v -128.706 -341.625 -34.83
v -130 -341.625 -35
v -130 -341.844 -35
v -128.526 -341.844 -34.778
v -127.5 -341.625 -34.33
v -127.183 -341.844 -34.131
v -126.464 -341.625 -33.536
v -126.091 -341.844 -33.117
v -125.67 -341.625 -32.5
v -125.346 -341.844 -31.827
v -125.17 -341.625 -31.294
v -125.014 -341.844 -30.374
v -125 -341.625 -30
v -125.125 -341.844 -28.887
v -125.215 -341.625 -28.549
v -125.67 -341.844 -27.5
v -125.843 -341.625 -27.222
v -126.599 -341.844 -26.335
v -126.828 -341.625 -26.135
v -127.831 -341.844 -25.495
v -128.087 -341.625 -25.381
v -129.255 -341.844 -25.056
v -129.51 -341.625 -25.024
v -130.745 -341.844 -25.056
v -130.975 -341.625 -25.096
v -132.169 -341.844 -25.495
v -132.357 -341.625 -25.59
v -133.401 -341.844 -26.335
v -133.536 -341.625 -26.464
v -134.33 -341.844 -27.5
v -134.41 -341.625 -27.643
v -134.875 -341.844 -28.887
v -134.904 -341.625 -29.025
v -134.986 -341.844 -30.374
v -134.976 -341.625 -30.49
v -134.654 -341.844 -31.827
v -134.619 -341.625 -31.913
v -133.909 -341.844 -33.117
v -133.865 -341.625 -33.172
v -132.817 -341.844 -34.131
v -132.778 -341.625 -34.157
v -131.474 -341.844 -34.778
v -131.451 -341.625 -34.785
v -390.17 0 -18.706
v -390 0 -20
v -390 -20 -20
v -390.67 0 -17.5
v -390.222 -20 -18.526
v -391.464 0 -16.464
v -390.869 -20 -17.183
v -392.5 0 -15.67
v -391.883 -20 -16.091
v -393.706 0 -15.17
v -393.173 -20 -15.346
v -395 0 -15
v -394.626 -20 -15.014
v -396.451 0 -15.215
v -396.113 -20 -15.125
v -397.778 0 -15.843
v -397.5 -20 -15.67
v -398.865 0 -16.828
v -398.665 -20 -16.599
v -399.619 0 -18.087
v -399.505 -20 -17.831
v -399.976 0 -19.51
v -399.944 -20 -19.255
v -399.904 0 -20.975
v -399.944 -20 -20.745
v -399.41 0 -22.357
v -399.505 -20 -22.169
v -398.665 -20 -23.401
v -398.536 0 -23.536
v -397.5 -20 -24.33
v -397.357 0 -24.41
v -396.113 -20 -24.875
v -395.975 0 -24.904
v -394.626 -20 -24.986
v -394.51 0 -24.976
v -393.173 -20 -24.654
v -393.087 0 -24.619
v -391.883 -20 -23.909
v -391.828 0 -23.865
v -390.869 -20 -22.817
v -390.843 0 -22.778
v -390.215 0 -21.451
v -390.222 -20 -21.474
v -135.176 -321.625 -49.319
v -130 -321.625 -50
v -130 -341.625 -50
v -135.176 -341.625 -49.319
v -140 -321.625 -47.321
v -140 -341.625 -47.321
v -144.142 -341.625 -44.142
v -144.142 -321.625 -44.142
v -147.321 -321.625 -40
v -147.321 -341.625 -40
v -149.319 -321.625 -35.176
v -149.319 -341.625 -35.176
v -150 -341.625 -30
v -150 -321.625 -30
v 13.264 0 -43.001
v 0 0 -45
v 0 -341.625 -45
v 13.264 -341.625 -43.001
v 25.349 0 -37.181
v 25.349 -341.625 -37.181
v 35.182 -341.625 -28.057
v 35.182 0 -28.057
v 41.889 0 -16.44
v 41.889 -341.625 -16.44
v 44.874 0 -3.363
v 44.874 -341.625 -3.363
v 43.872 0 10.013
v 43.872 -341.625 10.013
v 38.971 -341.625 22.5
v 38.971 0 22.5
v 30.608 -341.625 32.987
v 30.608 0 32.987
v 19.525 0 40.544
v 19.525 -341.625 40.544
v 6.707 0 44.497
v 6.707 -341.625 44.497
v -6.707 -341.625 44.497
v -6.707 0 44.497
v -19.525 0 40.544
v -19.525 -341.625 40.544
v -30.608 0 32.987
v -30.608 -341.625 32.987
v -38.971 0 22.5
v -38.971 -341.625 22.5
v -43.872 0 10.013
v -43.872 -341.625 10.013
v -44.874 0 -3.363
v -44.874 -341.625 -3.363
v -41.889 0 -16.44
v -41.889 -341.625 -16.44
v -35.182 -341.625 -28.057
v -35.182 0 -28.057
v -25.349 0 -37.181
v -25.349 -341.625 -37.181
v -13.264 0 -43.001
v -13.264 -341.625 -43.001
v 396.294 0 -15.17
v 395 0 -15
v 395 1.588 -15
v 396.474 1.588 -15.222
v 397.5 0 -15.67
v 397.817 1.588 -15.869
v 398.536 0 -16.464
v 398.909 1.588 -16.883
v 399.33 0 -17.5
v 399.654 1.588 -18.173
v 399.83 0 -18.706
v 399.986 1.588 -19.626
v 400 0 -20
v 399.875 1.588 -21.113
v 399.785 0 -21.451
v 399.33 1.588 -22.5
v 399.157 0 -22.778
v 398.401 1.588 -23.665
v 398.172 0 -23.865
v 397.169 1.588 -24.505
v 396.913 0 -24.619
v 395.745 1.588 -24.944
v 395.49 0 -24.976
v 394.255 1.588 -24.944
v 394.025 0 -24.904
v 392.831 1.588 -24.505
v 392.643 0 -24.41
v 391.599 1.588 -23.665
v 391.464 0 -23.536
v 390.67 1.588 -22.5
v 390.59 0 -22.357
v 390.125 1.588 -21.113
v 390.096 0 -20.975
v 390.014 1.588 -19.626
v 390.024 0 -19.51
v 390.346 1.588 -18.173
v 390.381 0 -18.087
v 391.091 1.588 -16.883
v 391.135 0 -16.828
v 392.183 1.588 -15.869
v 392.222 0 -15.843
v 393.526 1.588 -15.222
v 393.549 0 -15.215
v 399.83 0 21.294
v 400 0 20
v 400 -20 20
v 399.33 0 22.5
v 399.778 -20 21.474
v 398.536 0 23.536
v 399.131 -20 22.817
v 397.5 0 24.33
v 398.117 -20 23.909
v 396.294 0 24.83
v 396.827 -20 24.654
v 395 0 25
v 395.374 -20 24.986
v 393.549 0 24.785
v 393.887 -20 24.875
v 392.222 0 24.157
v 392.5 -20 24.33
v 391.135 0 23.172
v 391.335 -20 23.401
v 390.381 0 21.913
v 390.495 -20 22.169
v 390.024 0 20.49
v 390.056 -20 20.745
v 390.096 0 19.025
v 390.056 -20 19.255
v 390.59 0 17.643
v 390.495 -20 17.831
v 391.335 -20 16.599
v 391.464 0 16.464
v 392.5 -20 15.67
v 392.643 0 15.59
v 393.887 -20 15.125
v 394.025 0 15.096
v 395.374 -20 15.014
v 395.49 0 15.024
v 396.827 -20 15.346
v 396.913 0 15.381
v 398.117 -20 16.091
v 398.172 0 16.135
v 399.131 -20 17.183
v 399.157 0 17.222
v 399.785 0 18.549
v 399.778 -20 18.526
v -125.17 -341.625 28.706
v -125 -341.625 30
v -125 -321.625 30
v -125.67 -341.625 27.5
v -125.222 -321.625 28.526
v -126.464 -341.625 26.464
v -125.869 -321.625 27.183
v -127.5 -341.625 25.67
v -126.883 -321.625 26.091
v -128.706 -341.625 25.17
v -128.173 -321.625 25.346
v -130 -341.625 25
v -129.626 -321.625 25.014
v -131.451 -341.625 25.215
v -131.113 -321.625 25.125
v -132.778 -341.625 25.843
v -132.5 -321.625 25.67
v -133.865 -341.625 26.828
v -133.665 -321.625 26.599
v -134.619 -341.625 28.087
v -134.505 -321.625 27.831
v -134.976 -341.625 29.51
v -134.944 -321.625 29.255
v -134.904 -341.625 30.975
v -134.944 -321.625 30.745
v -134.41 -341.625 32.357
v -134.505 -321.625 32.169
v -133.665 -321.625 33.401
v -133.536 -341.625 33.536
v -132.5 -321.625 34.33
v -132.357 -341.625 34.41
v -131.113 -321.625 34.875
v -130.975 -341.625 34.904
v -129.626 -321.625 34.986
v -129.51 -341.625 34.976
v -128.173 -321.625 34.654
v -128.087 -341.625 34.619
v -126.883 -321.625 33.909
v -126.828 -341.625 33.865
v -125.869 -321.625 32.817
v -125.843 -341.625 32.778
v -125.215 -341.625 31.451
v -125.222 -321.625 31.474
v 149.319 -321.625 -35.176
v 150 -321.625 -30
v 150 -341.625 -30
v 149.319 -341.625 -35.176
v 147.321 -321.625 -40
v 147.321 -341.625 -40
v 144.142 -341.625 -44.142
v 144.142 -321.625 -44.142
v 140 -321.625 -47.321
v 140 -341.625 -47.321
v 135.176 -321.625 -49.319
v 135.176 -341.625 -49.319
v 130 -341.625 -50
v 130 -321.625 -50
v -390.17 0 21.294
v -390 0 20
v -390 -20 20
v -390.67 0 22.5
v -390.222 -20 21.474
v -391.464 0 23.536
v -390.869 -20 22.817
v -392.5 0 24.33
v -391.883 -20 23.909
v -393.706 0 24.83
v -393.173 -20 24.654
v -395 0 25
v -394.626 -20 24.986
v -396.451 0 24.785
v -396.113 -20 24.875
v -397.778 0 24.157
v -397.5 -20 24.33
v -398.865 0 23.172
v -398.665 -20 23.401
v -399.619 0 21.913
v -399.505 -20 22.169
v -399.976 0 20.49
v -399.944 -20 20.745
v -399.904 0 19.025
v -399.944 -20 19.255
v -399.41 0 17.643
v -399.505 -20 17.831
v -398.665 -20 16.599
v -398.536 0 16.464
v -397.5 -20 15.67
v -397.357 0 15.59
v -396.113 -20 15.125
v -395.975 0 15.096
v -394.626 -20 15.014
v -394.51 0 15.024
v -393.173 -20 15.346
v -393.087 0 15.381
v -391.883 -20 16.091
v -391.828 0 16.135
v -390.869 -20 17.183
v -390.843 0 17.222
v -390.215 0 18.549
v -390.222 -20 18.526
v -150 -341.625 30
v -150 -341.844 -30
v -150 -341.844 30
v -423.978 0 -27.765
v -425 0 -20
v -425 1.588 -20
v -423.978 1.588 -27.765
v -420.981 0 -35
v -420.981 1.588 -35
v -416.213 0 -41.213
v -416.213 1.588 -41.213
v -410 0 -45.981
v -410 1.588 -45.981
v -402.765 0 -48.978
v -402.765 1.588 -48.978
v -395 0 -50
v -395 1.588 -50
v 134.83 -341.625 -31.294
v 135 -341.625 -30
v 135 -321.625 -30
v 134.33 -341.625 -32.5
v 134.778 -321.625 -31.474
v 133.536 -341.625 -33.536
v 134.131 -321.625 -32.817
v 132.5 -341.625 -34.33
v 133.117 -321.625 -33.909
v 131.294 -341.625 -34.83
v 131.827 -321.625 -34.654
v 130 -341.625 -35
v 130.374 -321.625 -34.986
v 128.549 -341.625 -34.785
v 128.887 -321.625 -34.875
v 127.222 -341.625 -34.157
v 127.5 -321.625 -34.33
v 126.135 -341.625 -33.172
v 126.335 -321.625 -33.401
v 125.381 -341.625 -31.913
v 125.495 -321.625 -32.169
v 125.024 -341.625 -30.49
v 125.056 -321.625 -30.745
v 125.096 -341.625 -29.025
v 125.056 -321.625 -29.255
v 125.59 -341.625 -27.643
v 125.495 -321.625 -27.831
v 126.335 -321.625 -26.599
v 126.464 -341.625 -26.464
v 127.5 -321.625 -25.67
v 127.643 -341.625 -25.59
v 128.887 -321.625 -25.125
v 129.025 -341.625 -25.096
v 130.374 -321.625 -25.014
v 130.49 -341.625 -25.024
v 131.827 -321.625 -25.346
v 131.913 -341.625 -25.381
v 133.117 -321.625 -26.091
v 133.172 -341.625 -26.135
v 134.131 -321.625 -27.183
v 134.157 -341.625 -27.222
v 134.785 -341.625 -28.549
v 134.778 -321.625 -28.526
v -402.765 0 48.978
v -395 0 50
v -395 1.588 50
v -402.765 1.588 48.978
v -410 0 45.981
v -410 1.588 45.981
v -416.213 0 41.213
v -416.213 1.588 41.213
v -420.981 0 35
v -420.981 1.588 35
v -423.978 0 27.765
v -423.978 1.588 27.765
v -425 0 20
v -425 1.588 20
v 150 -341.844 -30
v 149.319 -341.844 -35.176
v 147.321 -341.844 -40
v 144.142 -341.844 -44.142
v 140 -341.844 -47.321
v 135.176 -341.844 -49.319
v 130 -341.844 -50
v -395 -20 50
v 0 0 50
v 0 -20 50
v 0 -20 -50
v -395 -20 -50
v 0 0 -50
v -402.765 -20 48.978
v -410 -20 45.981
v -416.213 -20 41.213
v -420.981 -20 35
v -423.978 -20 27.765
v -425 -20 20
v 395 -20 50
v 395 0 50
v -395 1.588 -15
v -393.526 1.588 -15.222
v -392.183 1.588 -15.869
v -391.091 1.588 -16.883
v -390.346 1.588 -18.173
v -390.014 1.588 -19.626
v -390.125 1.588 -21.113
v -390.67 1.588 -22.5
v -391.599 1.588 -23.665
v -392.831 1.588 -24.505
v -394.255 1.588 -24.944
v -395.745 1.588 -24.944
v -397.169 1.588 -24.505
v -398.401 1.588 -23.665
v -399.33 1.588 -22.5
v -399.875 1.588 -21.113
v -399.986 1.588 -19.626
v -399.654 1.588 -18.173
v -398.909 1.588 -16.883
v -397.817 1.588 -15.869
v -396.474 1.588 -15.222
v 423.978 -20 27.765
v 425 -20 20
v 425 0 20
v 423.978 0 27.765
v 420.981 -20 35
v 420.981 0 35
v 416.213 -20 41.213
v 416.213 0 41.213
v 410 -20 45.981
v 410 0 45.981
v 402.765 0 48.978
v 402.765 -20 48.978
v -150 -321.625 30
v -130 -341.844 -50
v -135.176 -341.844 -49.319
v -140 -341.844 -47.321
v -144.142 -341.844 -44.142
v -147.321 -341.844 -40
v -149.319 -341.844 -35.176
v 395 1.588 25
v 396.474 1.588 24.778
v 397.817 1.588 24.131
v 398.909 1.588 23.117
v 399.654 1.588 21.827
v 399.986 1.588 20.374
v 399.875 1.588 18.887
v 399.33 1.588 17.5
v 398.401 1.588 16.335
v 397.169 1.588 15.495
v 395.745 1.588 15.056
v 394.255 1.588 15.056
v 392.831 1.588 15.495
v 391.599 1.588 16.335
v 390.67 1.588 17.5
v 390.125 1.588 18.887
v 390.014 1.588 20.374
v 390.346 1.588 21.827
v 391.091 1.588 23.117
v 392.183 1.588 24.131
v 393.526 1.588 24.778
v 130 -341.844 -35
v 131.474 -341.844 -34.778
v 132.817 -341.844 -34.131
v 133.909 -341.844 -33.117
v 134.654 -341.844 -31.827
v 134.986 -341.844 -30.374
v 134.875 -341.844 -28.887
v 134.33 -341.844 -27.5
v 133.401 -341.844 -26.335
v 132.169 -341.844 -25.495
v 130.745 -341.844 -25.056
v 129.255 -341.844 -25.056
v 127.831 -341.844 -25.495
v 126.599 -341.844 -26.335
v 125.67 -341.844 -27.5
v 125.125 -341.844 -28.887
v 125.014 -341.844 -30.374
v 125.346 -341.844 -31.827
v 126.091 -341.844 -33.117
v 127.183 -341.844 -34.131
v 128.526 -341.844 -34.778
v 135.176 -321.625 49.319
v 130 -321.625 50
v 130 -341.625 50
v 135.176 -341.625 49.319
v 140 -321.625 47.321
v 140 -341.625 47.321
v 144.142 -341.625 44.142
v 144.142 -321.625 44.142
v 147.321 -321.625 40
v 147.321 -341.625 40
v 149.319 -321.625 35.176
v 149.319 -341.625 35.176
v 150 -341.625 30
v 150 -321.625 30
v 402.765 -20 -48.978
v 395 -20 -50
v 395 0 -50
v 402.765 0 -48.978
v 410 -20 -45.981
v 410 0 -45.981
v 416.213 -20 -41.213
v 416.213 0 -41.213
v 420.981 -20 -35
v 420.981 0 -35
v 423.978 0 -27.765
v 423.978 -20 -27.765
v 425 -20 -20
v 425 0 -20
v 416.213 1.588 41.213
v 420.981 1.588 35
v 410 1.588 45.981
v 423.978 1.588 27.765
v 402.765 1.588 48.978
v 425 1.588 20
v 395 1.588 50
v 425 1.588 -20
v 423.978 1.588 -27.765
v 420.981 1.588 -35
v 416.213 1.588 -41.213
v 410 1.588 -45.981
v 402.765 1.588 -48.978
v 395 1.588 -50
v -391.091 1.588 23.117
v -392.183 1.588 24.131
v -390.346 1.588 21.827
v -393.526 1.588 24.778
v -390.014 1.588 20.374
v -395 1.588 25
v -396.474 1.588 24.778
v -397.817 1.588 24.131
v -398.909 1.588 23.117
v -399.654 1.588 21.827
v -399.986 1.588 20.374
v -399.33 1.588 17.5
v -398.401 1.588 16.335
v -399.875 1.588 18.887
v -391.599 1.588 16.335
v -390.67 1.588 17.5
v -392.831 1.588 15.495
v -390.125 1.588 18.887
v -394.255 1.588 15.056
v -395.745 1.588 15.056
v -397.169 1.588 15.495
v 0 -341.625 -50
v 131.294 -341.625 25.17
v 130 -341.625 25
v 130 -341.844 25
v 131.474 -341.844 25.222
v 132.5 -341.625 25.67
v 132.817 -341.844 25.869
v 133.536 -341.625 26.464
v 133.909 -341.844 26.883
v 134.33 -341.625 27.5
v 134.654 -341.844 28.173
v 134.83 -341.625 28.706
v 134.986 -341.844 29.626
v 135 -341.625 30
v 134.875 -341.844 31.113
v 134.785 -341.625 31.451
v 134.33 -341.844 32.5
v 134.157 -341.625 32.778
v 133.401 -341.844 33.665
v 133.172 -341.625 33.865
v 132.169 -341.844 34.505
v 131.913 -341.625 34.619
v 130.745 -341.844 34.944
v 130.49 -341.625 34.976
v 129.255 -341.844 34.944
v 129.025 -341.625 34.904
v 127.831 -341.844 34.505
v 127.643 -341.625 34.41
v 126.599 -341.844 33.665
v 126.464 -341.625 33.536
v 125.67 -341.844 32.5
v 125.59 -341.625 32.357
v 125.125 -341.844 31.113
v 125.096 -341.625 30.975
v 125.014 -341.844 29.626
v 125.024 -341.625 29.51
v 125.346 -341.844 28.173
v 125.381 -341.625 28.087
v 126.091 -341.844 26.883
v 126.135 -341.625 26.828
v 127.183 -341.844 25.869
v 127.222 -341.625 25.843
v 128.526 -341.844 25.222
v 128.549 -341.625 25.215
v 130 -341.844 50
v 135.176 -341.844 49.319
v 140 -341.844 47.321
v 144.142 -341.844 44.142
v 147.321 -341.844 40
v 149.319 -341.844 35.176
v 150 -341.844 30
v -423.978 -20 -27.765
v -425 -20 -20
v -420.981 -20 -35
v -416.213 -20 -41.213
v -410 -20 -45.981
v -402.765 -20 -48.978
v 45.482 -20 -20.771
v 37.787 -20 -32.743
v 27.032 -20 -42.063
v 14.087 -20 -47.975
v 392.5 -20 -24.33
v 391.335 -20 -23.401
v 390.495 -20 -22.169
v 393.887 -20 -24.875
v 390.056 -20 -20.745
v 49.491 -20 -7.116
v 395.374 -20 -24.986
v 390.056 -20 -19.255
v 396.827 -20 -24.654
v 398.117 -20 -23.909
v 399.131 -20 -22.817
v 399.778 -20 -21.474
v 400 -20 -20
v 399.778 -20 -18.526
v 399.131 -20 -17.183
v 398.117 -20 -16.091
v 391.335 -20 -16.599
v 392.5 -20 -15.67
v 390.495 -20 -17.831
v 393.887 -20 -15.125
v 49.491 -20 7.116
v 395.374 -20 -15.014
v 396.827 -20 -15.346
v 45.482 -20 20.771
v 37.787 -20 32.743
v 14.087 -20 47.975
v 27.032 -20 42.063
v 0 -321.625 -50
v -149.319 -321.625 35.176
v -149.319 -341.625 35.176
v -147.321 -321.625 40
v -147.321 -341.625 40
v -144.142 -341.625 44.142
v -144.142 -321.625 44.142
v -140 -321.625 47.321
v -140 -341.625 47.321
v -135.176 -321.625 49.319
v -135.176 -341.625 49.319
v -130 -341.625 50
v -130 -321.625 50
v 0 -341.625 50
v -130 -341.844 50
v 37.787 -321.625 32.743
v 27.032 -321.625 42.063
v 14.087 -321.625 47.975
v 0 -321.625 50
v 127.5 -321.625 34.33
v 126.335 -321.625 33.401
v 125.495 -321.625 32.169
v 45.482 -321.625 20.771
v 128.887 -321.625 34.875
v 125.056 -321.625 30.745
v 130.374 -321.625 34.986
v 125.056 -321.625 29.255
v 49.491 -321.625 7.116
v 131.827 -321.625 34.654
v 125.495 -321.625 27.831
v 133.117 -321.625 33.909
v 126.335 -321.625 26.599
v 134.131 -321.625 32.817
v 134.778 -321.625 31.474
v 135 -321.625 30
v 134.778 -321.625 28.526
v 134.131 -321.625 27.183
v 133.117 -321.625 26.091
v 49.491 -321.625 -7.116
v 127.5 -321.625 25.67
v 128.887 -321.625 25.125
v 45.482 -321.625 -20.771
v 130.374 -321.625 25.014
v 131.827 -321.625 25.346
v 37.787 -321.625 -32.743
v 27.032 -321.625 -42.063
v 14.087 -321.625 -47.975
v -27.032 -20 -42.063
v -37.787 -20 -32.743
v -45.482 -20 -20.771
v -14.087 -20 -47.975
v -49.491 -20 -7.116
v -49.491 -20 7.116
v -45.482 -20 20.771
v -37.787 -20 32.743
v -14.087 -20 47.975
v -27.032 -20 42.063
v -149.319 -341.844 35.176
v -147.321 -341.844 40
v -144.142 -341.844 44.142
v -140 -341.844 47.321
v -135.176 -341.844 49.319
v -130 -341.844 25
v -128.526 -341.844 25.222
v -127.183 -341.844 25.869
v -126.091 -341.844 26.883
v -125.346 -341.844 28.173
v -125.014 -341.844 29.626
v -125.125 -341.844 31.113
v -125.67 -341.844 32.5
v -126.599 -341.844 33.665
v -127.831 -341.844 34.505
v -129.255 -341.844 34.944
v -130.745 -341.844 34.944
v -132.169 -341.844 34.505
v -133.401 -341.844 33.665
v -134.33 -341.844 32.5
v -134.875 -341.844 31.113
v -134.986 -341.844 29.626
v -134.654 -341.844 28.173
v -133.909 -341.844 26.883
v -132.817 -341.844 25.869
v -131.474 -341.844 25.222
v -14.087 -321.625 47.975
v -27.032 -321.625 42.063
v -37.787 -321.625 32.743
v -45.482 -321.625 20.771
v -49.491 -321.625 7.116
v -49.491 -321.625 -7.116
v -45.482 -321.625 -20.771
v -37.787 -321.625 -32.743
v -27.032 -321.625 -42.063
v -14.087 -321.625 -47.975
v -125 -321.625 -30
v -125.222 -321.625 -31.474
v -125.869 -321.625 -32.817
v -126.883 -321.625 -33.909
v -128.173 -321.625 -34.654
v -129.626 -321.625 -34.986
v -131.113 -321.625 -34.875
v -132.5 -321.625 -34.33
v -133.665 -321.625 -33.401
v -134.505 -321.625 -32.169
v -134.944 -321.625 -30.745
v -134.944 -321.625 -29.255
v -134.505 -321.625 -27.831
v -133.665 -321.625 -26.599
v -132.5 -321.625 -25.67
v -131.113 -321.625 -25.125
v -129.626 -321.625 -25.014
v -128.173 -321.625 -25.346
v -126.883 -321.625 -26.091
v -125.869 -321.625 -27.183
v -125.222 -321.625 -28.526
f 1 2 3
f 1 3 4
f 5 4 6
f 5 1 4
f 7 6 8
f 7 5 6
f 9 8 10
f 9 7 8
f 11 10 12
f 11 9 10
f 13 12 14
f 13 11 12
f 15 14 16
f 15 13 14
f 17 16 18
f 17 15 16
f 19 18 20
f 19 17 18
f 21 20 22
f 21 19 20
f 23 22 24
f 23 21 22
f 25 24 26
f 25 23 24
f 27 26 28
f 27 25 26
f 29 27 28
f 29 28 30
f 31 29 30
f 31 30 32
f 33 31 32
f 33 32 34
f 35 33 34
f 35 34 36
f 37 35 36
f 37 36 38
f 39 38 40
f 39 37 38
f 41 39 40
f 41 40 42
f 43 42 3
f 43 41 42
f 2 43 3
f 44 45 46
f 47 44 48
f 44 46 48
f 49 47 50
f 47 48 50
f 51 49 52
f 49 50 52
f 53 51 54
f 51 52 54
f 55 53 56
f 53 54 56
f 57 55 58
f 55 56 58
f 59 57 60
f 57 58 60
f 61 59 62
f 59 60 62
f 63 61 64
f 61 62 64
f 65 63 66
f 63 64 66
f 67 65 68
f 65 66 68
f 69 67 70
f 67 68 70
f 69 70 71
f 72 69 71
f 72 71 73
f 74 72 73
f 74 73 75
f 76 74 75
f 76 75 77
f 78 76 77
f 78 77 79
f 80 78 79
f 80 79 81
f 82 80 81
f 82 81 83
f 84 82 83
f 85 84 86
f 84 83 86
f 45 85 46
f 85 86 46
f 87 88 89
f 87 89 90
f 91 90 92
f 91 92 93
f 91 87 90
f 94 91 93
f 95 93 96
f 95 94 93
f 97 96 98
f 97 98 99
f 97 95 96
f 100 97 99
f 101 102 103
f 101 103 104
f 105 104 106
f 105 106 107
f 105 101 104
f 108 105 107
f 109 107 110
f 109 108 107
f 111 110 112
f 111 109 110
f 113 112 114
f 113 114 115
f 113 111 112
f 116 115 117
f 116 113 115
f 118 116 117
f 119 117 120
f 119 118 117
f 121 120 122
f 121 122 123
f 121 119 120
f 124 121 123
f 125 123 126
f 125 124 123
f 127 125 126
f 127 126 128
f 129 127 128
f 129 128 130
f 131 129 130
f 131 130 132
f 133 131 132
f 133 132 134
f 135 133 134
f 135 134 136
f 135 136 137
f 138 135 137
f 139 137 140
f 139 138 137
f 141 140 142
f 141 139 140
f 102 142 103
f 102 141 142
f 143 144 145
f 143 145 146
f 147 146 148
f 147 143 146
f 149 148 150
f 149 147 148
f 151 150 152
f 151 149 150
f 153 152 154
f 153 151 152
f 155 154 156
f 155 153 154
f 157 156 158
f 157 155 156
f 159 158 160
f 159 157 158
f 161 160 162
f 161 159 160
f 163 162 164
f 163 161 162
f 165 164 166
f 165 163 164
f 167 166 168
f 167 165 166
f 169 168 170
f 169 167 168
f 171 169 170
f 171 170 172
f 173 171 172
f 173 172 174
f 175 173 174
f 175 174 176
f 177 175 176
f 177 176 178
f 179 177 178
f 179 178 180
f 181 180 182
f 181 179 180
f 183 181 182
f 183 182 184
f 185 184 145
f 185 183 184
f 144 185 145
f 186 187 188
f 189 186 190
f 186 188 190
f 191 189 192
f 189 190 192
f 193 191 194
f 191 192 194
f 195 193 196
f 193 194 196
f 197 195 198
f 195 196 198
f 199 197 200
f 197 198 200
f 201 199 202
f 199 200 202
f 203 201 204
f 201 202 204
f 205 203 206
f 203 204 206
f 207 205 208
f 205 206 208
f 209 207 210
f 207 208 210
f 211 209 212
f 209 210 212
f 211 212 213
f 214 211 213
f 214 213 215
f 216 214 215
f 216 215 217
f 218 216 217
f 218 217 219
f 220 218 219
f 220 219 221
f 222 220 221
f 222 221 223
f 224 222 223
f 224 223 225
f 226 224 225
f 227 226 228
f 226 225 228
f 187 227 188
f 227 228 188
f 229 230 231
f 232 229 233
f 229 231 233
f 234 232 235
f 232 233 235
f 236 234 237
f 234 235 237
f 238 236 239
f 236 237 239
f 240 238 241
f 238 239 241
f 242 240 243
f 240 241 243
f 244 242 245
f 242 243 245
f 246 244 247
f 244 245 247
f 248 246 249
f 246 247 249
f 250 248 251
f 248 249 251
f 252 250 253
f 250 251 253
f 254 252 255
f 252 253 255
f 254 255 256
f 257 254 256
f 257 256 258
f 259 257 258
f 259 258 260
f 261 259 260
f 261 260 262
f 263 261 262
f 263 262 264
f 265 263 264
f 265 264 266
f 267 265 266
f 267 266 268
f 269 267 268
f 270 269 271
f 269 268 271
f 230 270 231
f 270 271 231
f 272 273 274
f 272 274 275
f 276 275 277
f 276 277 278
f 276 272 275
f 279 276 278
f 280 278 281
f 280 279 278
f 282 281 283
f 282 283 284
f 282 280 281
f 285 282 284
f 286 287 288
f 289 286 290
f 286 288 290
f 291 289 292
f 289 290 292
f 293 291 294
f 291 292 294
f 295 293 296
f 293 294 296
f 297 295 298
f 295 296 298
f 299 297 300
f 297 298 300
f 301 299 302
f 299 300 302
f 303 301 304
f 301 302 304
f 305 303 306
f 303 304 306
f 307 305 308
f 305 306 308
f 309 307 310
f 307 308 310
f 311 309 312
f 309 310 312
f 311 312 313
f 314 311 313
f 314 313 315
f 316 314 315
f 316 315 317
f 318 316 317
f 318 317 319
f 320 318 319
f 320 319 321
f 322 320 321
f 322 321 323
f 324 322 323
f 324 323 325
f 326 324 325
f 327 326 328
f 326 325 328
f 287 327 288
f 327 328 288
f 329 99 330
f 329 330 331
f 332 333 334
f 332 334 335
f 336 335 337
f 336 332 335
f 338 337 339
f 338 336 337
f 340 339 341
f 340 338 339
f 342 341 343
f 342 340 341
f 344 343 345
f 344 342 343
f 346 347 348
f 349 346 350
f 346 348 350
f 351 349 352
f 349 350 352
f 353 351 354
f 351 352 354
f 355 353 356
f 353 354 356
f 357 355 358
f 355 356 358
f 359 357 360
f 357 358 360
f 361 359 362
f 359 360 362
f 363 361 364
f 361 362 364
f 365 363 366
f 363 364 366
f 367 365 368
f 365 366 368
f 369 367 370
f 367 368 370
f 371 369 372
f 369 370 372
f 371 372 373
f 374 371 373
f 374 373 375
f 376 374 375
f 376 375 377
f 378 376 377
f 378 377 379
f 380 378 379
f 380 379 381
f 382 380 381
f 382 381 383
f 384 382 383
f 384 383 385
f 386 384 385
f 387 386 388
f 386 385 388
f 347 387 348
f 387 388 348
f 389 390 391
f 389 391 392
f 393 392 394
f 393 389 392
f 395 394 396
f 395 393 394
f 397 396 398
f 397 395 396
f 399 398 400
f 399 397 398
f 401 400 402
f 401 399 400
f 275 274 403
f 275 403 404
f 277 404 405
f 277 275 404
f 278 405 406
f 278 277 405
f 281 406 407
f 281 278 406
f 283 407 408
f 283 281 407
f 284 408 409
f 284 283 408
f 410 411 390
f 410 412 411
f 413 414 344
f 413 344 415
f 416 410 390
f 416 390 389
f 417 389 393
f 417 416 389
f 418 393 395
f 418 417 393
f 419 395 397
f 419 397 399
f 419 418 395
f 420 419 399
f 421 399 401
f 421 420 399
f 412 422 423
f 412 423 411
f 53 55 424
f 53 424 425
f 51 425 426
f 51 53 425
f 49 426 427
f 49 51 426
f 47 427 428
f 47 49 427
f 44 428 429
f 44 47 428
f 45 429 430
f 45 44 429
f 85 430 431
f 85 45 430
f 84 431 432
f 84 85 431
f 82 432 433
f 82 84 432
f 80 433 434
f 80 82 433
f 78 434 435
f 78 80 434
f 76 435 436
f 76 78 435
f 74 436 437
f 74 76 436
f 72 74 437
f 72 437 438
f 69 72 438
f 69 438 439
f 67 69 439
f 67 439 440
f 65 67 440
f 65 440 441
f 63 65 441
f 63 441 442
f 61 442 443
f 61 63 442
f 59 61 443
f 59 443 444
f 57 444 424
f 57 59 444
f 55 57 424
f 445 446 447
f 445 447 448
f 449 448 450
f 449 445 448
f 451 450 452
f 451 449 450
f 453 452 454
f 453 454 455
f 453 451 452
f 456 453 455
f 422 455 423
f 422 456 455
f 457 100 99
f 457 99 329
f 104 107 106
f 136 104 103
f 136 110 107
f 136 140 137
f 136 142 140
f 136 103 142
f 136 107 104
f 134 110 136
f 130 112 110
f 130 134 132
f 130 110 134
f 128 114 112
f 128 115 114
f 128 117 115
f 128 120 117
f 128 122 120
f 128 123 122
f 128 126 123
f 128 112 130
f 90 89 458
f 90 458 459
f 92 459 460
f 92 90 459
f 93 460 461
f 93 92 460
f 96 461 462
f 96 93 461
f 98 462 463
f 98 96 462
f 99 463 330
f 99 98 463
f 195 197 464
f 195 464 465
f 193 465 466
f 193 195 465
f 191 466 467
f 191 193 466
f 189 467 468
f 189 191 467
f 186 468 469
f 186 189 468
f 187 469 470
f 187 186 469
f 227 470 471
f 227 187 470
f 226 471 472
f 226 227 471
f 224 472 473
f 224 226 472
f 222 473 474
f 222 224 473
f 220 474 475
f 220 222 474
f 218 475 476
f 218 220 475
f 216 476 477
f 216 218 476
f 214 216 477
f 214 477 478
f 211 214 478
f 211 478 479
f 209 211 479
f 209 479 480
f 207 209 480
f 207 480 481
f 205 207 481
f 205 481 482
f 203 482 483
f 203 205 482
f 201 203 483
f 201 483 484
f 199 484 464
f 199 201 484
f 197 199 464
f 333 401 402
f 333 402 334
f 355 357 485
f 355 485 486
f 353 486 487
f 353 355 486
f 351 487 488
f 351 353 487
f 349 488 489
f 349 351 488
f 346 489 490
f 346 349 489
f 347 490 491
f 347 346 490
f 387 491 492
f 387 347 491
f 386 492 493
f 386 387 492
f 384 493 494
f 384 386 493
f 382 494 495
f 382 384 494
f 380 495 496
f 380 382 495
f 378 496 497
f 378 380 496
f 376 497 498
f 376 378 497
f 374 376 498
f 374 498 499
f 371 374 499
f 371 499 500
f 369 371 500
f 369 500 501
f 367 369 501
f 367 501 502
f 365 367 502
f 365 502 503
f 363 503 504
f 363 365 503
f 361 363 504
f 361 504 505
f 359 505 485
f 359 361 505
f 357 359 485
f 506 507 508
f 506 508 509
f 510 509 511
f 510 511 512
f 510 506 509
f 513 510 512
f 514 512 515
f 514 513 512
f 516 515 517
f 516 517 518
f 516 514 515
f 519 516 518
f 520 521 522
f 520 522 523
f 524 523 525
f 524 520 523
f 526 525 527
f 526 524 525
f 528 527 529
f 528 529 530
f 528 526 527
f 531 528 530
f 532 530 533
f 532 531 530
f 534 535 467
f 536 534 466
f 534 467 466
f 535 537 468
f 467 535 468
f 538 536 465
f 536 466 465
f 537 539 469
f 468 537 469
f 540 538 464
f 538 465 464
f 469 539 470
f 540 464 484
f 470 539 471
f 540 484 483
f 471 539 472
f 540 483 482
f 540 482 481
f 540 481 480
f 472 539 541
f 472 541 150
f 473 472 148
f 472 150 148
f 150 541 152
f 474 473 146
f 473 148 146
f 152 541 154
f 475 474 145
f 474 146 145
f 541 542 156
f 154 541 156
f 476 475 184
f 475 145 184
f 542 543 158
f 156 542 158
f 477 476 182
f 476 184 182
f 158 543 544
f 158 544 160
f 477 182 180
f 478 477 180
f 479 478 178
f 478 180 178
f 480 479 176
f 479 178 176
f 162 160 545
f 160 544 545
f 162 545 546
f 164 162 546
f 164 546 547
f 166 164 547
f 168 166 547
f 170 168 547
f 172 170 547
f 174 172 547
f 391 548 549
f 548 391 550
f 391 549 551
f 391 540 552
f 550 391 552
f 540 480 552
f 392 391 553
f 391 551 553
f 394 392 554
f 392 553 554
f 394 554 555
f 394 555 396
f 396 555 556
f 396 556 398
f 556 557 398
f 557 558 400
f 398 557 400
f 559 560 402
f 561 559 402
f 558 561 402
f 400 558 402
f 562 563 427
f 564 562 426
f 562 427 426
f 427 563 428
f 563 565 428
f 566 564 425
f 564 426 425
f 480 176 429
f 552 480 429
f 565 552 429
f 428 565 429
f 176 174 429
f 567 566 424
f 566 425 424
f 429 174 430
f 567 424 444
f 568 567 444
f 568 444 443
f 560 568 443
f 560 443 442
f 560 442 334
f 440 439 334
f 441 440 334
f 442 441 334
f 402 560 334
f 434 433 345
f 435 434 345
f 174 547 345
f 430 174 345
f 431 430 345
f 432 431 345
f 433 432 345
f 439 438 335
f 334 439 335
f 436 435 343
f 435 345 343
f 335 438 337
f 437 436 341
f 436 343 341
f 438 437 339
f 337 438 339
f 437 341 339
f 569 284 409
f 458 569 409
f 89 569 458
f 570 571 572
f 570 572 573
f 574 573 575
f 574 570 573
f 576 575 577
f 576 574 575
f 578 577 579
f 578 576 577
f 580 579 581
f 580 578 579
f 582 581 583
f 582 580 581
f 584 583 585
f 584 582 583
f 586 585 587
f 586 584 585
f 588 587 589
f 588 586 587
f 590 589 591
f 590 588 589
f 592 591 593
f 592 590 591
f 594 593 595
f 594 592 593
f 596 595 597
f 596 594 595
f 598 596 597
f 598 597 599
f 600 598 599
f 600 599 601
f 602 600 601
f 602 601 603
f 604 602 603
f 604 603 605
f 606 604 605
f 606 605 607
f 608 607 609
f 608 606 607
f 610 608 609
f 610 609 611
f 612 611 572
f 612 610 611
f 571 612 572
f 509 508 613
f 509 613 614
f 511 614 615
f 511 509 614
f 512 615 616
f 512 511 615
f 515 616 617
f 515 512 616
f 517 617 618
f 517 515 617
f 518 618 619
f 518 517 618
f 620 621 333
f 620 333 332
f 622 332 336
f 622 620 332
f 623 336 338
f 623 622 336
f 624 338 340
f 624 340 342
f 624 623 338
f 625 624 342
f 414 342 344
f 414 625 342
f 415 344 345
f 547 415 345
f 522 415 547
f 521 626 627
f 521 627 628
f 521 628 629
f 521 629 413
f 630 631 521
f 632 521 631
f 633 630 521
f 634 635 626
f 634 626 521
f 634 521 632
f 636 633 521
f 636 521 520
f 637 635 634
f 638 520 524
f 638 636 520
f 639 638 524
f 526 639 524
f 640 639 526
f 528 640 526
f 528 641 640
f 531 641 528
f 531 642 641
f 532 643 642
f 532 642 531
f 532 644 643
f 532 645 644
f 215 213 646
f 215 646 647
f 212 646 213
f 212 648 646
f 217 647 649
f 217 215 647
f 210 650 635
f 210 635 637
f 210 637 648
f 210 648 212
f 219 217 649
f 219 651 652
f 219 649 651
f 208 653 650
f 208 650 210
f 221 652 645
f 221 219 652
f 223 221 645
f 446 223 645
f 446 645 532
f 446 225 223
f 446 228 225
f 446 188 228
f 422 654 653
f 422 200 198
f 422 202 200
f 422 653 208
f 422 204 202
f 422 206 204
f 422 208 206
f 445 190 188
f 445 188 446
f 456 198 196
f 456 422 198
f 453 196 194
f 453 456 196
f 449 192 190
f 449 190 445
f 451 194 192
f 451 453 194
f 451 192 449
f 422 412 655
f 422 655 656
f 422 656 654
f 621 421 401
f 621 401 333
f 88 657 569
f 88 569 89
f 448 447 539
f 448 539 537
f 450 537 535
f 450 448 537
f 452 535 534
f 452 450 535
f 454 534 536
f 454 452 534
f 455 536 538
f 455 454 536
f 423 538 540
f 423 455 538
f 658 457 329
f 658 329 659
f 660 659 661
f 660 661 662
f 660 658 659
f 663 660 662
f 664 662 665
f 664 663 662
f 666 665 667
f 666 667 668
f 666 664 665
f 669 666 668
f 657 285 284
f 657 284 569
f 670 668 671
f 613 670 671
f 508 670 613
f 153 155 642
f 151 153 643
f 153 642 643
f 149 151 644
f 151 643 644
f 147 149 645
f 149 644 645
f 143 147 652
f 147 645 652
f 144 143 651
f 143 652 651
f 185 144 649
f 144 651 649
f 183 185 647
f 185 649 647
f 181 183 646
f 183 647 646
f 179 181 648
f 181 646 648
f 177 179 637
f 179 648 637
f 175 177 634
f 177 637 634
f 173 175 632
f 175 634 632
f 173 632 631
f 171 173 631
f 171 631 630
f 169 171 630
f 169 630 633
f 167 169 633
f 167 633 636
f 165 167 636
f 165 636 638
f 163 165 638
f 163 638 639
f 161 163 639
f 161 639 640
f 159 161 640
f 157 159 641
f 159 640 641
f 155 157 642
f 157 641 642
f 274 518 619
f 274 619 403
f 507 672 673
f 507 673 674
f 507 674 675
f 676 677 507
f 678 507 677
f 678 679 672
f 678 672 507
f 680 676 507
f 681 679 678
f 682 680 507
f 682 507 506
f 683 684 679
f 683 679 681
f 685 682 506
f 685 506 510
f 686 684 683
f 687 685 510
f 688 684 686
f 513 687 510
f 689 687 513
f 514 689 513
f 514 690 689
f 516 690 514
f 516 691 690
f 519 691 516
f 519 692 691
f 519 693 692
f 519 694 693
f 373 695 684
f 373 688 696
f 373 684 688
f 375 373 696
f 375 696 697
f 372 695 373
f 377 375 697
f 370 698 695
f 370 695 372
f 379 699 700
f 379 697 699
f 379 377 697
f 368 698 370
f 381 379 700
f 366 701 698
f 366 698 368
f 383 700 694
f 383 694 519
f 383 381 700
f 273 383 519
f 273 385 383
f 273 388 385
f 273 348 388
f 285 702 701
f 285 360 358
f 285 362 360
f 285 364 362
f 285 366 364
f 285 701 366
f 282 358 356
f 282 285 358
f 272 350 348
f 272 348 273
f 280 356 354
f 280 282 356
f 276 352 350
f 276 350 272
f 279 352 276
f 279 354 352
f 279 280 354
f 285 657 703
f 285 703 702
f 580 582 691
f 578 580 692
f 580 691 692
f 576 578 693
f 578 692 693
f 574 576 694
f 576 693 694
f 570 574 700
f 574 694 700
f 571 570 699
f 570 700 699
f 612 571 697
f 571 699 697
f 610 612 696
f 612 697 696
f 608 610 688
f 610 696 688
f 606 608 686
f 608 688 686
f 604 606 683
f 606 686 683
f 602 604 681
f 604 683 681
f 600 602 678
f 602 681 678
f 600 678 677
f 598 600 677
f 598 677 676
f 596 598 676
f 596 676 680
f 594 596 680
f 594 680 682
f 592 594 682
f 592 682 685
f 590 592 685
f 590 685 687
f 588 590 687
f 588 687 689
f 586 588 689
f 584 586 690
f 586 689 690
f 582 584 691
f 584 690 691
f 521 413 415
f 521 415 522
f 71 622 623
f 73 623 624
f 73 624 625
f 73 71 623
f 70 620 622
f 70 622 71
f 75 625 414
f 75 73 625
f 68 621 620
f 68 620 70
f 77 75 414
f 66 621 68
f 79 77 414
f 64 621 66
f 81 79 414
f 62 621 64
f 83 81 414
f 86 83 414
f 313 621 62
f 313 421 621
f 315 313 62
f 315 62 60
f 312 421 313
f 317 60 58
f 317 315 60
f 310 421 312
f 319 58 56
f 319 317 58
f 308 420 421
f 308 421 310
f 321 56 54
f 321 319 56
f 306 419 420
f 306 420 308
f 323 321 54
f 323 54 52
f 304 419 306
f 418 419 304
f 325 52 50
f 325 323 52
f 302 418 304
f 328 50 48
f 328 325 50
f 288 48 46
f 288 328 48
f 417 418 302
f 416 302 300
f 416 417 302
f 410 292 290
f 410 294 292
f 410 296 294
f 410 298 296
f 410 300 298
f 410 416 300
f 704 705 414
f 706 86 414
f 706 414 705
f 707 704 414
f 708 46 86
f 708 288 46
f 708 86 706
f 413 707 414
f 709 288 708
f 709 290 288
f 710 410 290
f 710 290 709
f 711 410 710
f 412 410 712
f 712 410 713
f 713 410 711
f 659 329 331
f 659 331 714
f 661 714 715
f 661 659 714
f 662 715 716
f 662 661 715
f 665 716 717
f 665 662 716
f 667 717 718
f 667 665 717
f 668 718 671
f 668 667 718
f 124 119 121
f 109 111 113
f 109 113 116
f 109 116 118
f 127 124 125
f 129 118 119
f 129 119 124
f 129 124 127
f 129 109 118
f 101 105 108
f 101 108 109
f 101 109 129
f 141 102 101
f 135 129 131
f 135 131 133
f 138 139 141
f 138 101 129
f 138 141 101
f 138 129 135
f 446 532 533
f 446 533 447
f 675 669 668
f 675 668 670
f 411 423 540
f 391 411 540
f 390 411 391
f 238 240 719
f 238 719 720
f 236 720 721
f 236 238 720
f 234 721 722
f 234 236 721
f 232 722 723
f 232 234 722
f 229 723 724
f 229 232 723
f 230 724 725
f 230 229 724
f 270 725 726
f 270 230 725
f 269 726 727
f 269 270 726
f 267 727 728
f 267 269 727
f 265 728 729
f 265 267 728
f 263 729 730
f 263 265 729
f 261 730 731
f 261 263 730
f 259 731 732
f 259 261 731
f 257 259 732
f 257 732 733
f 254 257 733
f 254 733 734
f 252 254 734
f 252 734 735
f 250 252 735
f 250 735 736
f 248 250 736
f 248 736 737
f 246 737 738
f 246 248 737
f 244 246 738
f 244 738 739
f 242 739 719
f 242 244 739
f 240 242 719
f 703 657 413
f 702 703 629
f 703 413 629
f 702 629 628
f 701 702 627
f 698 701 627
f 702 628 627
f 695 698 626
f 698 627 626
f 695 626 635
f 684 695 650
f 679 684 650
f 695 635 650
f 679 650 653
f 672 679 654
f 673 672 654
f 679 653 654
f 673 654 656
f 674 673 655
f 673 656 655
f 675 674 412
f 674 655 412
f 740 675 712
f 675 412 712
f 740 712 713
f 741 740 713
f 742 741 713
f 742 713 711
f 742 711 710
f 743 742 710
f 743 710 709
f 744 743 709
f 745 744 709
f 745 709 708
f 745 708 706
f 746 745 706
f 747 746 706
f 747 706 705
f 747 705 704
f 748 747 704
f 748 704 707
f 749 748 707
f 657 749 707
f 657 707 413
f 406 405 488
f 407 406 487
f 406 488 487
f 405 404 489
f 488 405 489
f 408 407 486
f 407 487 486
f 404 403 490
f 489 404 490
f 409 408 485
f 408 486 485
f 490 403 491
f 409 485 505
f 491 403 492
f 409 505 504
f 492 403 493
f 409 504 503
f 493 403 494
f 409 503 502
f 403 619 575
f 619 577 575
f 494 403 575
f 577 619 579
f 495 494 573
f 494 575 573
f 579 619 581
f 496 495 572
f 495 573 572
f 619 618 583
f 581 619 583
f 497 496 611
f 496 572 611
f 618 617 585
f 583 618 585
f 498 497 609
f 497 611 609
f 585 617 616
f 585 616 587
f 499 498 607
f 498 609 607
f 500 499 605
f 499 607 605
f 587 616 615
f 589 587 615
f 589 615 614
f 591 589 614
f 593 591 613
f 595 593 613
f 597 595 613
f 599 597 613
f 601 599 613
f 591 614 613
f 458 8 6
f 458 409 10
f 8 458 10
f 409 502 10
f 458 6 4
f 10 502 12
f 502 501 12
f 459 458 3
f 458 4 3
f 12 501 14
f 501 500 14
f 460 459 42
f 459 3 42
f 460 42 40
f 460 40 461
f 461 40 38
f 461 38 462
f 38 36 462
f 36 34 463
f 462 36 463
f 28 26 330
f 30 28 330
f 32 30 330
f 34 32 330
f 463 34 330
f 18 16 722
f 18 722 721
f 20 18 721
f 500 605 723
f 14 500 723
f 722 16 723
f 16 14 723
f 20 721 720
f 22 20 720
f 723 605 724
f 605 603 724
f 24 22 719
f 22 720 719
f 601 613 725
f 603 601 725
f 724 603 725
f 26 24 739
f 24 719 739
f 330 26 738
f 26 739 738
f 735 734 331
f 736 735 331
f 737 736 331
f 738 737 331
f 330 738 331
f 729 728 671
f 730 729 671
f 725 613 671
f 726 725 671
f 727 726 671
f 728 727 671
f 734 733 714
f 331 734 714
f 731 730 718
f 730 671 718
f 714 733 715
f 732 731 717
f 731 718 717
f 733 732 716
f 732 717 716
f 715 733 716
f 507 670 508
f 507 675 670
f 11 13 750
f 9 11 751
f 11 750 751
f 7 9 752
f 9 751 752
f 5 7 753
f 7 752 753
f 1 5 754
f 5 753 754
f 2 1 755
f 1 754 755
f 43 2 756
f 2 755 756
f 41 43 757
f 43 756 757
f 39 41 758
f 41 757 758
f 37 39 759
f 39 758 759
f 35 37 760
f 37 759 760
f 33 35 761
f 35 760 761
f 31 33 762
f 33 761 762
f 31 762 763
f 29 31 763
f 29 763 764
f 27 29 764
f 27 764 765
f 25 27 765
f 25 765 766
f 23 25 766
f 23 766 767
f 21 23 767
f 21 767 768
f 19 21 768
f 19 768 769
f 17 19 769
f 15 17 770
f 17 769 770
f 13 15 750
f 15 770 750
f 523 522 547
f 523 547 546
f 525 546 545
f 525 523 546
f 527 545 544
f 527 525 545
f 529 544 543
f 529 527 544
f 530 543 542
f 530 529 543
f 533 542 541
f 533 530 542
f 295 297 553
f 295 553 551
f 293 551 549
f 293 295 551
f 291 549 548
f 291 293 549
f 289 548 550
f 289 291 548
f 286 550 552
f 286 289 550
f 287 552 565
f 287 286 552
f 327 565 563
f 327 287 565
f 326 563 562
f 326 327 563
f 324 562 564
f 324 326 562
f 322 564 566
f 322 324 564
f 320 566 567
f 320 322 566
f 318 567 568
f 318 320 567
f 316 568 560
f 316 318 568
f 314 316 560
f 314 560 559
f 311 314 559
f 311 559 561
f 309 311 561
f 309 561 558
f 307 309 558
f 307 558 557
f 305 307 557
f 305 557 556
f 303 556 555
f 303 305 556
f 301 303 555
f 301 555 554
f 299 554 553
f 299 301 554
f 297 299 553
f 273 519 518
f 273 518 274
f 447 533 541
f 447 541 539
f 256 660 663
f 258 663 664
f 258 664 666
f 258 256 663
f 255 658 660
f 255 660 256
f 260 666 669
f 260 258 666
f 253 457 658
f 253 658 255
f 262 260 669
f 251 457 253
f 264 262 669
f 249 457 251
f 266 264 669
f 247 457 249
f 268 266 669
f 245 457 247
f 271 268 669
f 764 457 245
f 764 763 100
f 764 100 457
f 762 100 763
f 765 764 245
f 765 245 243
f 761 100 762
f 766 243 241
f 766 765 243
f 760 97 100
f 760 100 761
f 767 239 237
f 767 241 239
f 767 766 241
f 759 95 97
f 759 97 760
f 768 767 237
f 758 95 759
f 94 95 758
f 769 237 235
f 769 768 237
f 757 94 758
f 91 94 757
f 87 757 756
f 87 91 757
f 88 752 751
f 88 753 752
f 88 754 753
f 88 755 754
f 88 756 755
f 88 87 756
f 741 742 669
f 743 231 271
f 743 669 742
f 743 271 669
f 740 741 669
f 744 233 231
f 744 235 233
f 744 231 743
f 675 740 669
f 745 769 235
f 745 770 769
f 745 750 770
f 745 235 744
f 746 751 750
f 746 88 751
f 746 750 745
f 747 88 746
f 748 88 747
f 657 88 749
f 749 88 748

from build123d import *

# Parameters (mm, degrees)
SKETCH1_R           = 5
BOSS_EXTRUDE1_DEPTH = 1.5875
SKETCH2_R           = 50
SKETCH2_R_2         = 45
BOSS_EXTRUDE2_DEPTH = 341.625
SKETCH3_R           = 5
BOSS_EXTRUDE3_DEPTH = 0.218965517
BOSS_EXTRUDE4_START = 20
SKETCH4_R           = 5
BOSS_EXTRUDE4_DEPTH = 20
BOSS_EXTRUDE5_START = 20
SKETCH5_R           = 5
BOSS_EXTRUDE5_DEPTH = 20


with BuildPart() as part:
    # Sketch1 → Boss-Extrude1 (new body)
    with BuildSketch(Plane(origin=(0, 0, 0), x_dir=(1, 0, 0), z_dir=(0, 1, 0))):
        with BuildLine():
            Line((-395, 50), (395, 50))
            ThreePointArc((395, 50), (416.213203436, 41.213203436), (425, 20))
            Line((425, 20), (425, -20))
            ThreePointArc((425, -20), (416.213203436, -41.213203436), (395, -50))
            Line((395, -50), (-395, -50))
            ThreePointArc((-395, -50), (-416.213203436, -41.213203436), (-425, -20))
            Line((-425, -20), (-425, 20))
            ThreePointArc((-425, 20), (-416.213203436, 41.213203436), (-395, 50))
        make_face()
        with Locations((-395, 20)):
            Circle(SKETCH1_R, mode=Mode.SUBTRACT)
        with Locations((-395, -20)):
            Circle(SKETCH1_R, mode=Mode.SUBTRACT)
        with Locations((395, 20)):
            Circle(SKETCH1_R, mode=Mode.SUBTRACT)
        with Locations((395, -20)):
            Circle(SKETCH1_R, mode=Mode.SUBTRACT)
    extrude(amount=BOSS_EXTRUDE1_DEPTH)

    # Sketch2 → Boss-Extrude2 (add)
    with BuildSketch(Plane.XZ):
        Circle(SKETCH2_R)
        Circle(SKETCH2_R_2, mode=Mode.SUBTRACT)
    extrude(amount=BOSS_EXTRUDE2_DEPTH)

    # Sketch3 → Boss-Extrude3 (add)
    with BuildSketch(Plane.XZ.offset(341.625)):
        with BuildLine():
            Line((-130, 50), (130, 50))
            ThreePointArc((130, 50), (144.142135624, 44.142135624), (150, 30))
            Line((150, 30), (150, -30))
            ThreePointArc((150, -30), (144.142135624, -44.142135624), (130, -50))
            Line((130, -50), (-130, -50))
            ThreePointArc((-130, -50), (-144.142135624, -44.142135624), (-150, -30))
            Line((-150, -30), (-150, 30))
            ThreePointArc((-150, 30), (-144.142135624, 44.142135624), (-130, 50))
        make_face()
        with Locations((-130, 30)):
            Circle(SKETCH3_R, mode=Mode.SUBTRACT)
        with Locations((-130, -30)):
            Circle(SKETCH3_R, mode=Mode.SUBTRACT)
        with Locations((130, 30)):
            Circle(SKETCH3_R, mode=Mode.SUBTRACT)
        with Locations((130, -30)):
            Circle(SKETCH3_R, mode=Mode.SUBTRACT)
    extrude(amount=BOSS_EXTRUDE3_DEPTH)

    # Sketch4 → Boss-Extrude4 (add)
    # profile 1 of 2: a face of its own
    with BuildSketch(Plane.XZ.offset(BOSS_EXTRUDE4_START)):
        with BuildLine():
            ThreePointArc((0, 50), (50, 0), (0, -50))
            Line((0, -50), (395, -50))
            ThreePointArc((395, -50), (416.213203436, -41.213203436), (425, -20))
            Line((425, -20), (425, 20))
            ThreePointArc((425, 20), (416.213203436, 41.213203436), (395, 50))
            Line((395, 50), (0, 50))
        make_face()
        with Locations((395, -20)):
            Circle(SKETCH4_R, mode=Mode.SUBTRACT)
        with Locations((395, 20)):
            Circle(SKETCH4_R, mode=Mode.SUBTRACT)
    # profile 2 of 2: a face of its own
    with BuildSketch(Plane.XZ.offset(BOSS_EXTRUDE4_START)):
        with BuildLine():
            Line((-395, -50), (0, -50))
            ThreePointArc((0, -50), (-50, 0), (0, 50))
            Line((0, 50), (-395, 50))
            ThreePointArc((-395, 50), (-416.213203436, 41.213203436), (-425, 20))
            Line((-425, 20), (-425, -20))
            ThreePointArc((-425, -20), (-416.213203436, -41.213203436), (-395, -50))
        make_face()
        with Locations((-395, -20)):
            Circle(SKETCH4_R, mode=Mode.SUBTRACT)
        with Locations((-395, 20)):
            Circle(SKETCH4_R, mode=Mode.SUBTRACT)
    extrude(amount=-BOSS_EXTRUDE4_DEPTH)

    # Sketch5 → Boss-Extrude5 (add)
    # profile 1 of 2: a face of its own
    with BuildSketch(Plane(origin=(0, -341.625, 0), x_dir=(1, 0, 0), z_dir=(0, 1, 0)).offset(BOSS_EXTRUDE5_START)):
        with BuildLine():
            ThreePointArc((150, 30), (144.142135624, 44.142135624), (130, 50))
            Line((130, 50), (0, 50))
            ThreePointArc((0, 50), (50, 0), (0, -50))
            Line((0, -50), (130, -50))
            ThreePointArc((130, -50), (144.142135624, -44.142135624), (150, -30))
            Line((150, -30), (150, 30))
        make_face()
        with Locations((130, -30)):
            Circle(SKETCH5_R, mode=Mode.SUBTRACT)
        with Locations((130, 30)):
            Circle(SKETCH5_R, mode=Mode.SUBTRACT)
    # profile 2 of 2: a face of its own
    with BuildSketch(Plane(origin=(0, -341.625, 0), x_dir=(1, 0, 0), z_dir=(0, 1, 0)).offset(BOSS_EXTRUDE5_START)):
        with BuildLine():
            ThreePointArc((0, -50), (-50, 0), (0, 50))
            Line((0, 50), (-130, 50))
            ThreePointArc((-130, 50), (-144.142135624, 44.142135624), (-150, 30))
            Line((-150, 30), (-150, -30))
            ThreePointArc((-150, -30), (-144.142135624, -44.142135624), (-130, -50))
            Line((-130, -50), (0, -50))
        make_face()
        with Locations((-130, -30)):
            Circle(SKETCH5_R, mode=Mode.SUBTRACT)
        with Locations((-130, 30)):
            Circle(SKETCH5_R, mode=Mode.SUBTRACT)
    extrude(amount=-BOSS_EXTRUDE5_DEPTH)


solid = part.part
